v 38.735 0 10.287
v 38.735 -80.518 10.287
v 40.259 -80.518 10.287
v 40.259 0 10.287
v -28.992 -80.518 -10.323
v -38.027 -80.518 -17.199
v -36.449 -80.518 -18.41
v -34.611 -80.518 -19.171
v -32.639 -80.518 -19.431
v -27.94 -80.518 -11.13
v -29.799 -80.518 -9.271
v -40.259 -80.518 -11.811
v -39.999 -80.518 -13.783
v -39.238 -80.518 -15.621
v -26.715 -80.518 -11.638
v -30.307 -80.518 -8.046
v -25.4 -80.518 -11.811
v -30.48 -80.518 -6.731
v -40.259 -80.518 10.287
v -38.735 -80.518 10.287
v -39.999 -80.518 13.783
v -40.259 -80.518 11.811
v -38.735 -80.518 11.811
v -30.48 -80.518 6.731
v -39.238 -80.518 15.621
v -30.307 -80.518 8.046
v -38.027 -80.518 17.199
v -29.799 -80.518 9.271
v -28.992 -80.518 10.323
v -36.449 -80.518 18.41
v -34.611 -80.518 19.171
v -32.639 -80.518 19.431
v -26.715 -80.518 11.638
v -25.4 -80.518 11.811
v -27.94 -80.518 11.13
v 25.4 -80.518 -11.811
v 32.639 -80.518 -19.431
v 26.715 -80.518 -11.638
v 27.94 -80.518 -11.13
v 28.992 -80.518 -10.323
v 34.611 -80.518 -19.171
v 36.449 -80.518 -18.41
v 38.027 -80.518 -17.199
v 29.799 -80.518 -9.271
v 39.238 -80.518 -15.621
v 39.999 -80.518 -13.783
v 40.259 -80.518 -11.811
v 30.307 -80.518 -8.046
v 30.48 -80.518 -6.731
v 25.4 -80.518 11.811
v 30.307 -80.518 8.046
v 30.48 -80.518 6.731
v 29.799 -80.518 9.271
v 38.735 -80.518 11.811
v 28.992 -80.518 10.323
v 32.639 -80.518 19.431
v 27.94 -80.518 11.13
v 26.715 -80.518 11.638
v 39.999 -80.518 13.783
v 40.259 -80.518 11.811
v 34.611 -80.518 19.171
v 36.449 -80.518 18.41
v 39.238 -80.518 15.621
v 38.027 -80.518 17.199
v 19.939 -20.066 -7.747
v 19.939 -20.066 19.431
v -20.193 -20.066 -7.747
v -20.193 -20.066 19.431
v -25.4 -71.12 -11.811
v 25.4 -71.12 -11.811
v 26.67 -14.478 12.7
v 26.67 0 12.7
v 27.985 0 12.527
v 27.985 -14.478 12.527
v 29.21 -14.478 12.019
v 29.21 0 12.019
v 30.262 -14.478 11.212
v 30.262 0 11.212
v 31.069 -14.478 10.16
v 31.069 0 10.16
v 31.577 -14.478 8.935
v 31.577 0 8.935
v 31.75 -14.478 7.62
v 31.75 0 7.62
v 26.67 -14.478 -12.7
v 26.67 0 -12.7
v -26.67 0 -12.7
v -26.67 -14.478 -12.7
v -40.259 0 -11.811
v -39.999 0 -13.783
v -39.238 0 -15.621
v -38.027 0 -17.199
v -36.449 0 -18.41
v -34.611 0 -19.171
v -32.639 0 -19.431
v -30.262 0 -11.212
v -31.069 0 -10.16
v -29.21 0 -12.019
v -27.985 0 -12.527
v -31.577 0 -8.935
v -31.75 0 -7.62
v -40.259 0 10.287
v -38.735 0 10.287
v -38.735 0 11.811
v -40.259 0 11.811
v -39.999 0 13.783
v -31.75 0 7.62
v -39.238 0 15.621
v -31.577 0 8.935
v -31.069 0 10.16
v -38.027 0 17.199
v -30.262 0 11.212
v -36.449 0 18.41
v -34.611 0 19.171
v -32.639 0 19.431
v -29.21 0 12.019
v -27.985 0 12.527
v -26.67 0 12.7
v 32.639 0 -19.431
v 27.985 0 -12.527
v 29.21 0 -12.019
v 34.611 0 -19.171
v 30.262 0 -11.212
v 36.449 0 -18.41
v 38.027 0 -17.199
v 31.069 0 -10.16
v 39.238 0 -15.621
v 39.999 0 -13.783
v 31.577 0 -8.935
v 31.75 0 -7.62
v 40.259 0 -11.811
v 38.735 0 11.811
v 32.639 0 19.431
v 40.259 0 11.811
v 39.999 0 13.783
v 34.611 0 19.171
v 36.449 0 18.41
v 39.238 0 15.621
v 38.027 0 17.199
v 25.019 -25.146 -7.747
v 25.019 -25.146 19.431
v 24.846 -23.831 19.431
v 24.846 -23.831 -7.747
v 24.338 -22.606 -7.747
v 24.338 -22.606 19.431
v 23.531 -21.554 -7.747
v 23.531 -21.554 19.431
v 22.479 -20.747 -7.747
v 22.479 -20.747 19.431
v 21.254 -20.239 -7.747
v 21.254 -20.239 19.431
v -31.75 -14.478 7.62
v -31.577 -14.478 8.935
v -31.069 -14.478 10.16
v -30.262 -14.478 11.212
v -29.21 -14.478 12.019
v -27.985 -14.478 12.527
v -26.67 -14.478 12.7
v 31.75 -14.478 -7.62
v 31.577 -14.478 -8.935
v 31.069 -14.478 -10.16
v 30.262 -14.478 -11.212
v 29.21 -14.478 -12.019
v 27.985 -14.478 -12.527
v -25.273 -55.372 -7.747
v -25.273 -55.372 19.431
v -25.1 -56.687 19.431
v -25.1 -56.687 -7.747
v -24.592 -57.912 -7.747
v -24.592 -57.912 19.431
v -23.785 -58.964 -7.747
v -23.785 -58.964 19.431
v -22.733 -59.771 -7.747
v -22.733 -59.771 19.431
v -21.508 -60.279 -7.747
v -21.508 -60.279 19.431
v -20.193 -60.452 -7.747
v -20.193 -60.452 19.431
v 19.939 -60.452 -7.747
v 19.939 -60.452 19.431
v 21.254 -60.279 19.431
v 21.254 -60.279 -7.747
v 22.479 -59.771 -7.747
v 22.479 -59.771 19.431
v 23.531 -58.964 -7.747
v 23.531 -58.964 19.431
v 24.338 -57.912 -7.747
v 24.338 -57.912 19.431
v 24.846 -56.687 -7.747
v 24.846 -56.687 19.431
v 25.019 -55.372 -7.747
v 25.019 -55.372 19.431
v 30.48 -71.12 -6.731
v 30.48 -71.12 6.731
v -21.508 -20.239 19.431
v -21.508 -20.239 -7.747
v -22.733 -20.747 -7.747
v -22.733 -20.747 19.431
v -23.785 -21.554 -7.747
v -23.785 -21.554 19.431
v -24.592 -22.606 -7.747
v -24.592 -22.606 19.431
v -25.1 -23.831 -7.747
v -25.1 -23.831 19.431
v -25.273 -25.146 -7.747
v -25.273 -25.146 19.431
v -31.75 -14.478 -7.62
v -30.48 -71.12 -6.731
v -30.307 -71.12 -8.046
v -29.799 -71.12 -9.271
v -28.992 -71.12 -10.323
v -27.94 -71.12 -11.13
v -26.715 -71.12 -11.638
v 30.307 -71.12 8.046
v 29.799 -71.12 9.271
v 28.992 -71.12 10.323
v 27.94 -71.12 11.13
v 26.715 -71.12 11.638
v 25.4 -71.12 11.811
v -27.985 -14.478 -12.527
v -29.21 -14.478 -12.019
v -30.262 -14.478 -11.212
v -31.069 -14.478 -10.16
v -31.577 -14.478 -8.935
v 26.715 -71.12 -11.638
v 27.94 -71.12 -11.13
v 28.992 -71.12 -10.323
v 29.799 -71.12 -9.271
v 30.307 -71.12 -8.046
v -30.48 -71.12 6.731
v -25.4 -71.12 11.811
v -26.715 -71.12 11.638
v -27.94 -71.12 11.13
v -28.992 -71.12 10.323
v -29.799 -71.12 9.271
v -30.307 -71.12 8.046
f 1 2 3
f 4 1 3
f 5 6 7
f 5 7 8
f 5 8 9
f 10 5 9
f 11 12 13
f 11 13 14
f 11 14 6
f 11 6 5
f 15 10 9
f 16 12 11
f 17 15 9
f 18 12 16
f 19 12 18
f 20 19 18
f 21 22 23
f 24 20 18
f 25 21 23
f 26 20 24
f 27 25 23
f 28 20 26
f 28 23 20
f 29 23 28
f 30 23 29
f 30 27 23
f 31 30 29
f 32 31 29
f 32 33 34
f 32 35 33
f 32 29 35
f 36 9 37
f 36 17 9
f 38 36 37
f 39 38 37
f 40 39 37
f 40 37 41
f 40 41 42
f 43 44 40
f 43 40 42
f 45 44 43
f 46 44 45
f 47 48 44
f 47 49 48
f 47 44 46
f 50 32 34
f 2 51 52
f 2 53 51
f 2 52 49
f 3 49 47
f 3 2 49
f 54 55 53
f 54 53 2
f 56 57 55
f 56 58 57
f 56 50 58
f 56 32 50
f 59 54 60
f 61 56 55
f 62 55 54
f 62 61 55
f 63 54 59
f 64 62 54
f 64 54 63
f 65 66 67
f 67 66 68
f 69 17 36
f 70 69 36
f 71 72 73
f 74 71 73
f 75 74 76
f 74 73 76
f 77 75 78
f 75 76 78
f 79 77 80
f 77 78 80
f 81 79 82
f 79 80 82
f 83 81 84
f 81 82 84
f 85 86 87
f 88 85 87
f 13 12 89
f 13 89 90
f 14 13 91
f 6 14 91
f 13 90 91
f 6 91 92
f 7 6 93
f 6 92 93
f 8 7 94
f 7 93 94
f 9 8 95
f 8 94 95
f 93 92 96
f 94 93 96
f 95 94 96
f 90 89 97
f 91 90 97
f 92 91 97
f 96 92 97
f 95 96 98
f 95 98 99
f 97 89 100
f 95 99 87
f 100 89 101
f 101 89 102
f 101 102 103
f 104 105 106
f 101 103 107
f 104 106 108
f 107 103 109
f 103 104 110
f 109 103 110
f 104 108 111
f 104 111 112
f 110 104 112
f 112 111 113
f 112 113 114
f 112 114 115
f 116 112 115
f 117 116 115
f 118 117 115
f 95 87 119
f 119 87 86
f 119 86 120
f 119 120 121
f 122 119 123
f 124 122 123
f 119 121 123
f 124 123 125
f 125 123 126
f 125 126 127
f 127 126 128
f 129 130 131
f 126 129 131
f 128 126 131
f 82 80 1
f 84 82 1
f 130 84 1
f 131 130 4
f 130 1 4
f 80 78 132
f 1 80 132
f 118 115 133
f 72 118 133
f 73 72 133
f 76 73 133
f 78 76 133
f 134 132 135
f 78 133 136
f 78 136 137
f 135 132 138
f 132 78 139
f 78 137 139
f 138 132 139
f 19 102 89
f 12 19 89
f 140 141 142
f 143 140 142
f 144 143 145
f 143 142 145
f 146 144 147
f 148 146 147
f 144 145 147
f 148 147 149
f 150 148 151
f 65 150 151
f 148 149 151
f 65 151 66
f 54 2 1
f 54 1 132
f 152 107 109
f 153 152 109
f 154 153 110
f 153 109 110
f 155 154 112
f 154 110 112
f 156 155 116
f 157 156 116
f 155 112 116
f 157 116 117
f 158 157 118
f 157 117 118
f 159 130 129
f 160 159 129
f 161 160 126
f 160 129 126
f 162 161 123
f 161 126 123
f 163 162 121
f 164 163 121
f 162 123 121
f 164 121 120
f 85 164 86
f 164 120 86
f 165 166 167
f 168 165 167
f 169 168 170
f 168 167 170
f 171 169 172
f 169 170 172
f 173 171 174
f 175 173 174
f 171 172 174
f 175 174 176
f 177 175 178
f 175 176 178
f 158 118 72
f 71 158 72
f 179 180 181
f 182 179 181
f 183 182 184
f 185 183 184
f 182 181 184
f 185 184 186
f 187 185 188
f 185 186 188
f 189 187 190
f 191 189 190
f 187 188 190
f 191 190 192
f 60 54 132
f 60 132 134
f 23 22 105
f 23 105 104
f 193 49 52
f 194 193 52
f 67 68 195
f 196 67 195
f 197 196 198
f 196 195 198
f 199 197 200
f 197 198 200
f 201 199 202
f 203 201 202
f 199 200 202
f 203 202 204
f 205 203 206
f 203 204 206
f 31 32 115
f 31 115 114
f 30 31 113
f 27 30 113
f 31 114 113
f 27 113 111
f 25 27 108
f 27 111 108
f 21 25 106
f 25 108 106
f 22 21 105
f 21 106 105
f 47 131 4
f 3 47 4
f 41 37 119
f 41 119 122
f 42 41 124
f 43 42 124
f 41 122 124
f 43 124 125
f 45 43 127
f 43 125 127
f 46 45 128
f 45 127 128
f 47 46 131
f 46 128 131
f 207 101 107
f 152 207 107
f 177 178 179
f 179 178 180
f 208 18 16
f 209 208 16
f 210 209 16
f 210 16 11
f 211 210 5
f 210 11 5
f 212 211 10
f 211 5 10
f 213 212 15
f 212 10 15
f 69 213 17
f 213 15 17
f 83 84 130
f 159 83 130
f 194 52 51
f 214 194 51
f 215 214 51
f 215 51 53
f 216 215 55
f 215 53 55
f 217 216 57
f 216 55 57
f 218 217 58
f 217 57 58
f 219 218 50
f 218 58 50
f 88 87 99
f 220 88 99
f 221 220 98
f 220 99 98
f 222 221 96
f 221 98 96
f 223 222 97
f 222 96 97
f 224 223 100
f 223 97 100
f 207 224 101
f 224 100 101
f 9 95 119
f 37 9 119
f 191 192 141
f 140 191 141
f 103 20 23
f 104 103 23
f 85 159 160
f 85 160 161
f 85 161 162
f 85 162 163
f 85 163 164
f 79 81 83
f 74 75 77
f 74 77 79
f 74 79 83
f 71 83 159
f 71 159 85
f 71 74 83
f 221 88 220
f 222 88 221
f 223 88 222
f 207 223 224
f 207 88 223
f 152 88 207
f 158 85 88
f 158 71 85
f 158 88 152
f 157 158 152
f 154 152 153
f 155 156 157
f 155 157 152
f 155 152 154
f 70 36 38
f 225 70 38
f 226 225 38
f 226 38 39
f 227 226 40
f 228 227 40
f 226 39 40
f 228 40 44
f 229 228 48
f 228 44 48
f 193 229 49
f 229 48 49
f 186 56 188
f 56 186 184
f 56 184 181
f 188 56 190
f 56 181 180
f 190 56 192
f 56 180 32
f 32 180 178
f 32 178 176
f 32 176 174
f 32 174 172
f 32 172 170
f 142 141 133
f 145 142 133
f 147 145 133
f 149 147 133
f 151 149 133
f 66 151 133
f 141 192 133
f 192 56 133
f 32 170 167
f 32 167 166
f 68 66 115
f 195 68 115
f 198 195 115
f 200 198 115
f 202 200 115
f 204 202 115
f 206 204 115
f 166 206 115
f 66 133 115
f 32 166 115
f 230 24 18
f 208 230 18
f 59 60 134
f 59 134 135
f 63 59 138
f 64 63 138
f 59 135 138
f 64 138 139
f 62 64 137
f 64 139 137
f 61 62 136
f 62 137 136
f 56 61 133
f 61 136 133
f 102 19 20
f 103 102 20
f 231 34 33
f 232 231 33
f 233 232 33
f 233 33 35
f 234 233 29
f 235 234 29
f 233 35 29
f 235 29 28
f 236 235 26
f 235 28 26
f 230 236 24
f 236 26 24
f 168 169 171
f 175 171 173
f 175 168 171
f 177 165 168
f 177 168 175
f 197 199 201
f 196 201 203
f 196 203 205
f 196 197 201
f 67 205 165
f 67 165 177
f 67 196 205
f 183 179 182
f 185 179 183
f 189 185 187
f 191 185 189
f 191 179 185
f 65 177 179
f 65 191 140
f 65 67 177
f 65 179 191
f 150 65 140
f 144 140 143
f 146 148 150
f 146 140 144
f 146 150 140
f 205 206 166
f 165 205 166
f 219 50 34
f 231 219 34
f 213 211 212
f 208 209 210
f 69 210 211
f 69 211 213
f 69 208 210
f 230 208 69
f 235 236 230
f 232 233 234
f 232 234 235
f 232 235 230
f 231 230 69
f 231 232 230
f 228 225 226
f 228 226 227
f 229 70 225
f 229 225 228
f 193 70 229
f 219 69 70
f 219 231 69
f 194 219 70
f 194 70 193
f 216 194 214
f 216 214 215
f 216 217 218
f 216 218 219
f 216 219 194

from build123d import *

# Parameters (mm, degrees)
F1_DEPTH = 80.518
F3_DEPTH = 9.398
F4_W     = 1.524
F4_H     = 1.524
F5_DEPTH = 80.519
F7_DEPTH = 27.178
F9_DEPTH = 14.478


with BuildPart() as f1:
    # F0 (on Front) → F1 (new body)
    with BuildSketch(Plane.XZ):
        with BuildLine():
            ThreePointArc((40.259, 11.811), (38.027154, 17.199154), (32.639, 19.431))
            Line((32.639, 19.431), (-32.639, 19.431))
            ThreePointArc((-32.639, 19.431), (-38.027154, 17.199154), (-40.259, 11.811))
            Line((-40.259, 11.811), (-40.259, -11.811))
            ThreePointArc((-40.259, -11.811), (-38.027154, -17.199154), (-32.639, -19.431))
            Line((-32.639, -19.431), (32.639, -19.431))
            ThreePointArc((32.639, -19.431), (38.027154, -17.199154), (40.259, -11.811))
            Line((40.259, -11.811), (40.259, 11.811))
        make_face()
    extrude(amount=F1_DEPTH)

    # F2 (on face) → F3 (cut)
    with BuildSketch(Plane.XZ.offset(80.518)):
        with BuildLine():
            ThreePointArc((30.48, 6.731), (28.992102, 10.323102), (25.4, 11.811))
            Line((25.4, 11.811), (-25.4, 11.811))
            ThreePointArc((-25.4, 11.811), (-28.992102, 10.323102), (-30.48, 6.731))
            Line((-30.48, 6.731), (-30.48, -6.731))
            ThreePointArc((-30.48, -6.731), (-28.992102, -10.323102), (-25.4, -11.811))
            Line((-25.4, -11.811), (25.4, -11.811))
            ThreePointArc((25.4, -11.811), (28.992102, -10.323102), (30.48, -6.731))
            Line((30.48, -6.731), (30.48, 6.731))
        make_face()
    extrude(amount=-F3_DEPTH, mode=Mode.SUBTRACT)

    # F4 (on face) → F5 (cut, through all)
    with BuildSketch(Plane.XZ.offset(80.518)):
        with Locations((-39.497, 11.049)):
            Rectangle(F4_W, F4_H)
        with Locations((39.497, 11.049)):
            Rectangle(F4_W, F4_H)
    extrude(amount=-F5_DEPTH, mode=Mode.SUBTRACT)

    # F6 (on face) → F7 (cut)
    with BuildSketch(Plane.XY.offset(19.431)):
        with BuildLine():
            Line((19.939, -20.066), (-20.193, -20.066))
            ThreePointArc((-20.193, -20.066), (-23.785102, -21.553898), (-25.273, -25.146))
            Line((-25.273, -25.146), (-25.273, -55.372))
            ThreePointArc((-25.273, -55.372), (-23.785102, -58.964102), (-20.193, -60.452))
            Line((-20.193, -60.452), (19.939, -60.452))
            ThreePointArc((19.939, -60.452), (23.531102, -58.964102), (25.019, -55.372))
            Line((25.019, -55.372), (25.019, -25.146))
            ThreePointArc((25.019, -25.146), (23.531102, -21.553898), (19.939, -20.066))
        make_face()
    extrude(amount=-F7_DEPTH, mode=Mode.SUBTRACT)

    # F8 (on face) → F9 (cut)
    with BuildSketch(Plane(origin=(0, 0, 0), x_dir=(-1, 0, 0), z_dir=(0, 1, 0))):
        with BuildLine():
            ThreePointArc((31.75, 7.62), (30.262102, 11.212102), (26.67, 12.7))
            Line((26.67, 12.7), (-26.67, 12.7))
            ThreePointArc((-26.67, 12.7), (-30.262102, 11.212102), (-31.75, 7.62))
            Line((-31.75, 7.62), (-31.75, -7.62))
            ThreePointArc((-31.75, -7.62), (-30.262102, -11.212102), (-26.67, -12.7))
            Line((-26.67, -12.7), (26.67, -12.7))
            ThreePointArc((26.67, -12.7), (30.262102, -11.212102), (31.75, -7.62))
            Line((31.75, -7.62), (31.75, 7.62))
        make_face()
    extrude(amount=-F9_DEPTH, mode=Mode.SUBTRACT)


solid = f1.part
